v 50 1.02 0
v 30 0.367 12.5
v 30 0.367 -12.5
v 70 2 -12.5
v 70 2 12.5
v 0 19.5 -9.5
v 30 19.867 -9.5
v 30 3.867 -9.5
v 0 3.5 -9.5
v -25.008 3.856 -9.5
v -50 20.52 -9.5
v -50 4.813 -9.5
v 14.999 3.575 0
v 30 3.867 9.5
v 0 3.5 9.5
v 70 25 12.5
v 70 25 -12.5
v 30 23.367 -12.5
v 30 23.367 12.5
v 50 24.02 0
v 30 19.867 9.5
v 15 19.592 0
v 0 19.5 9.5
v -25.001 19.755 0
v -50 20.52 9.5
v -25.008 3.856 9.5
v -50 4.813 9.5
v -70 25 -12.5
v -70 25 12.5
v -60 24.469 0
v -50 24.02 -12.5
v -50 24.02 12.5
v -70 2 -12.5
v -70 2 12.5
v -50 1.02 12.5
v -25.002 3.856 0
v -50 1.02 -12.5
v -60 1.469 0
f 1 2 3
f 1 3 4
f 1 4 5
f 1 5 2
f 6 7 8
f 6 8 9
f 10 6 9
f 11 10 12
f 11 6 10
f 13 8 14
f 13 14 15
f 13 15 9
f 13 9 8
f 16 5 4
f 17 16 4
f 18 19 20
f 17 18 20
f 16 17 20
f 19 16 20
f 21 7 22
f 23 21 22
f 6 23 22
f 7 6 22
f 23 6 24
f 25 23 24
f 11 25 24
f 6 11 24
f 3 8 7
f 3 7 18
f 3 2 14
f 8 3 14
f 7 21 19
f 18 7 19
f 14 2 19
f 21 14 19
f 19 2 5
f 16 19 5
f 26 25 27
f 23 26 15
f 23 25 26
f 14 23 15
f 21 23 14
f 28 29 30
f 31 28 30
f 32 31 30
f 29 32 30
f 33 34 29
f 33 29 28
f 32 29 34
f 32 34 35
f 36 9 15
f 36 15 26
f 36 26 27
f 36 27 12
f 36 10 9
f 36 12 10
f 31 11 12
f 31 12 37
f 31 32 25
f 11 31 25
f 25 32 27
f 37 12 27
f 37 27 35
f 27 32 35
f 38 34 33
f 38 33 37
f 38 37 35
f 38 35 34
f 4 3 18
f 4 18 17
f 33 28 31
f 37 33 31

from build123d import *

# Parameters (mm, degrees)
SKETCH1_W           = 140
SKETCH1_H           = 25
BOSS_EXTRUDE1_DEPTH = 25
CUT_EXTRUDE1_DEPTH  = 25
CUT_EXTRUDE13_DEPTH = 3
SKETCH9_W           = 80
SKETCH9_H           = 18.70062617
CUT_EXTRUDE14_DEPTH = 3


with BuildPart() as part:
    # Sketch1 → Boss-Extrude1 (new body)
    with BuildSketch(Plane(origin=(0, 0, 0), x_dir=(1, 0, 0), z_dir=(0, 1, 0))):
        Rectangle(SKETCH1_W, SKETCH1_H)
    extrude(amount=BOSS_EXTRUDE1_DEPTH)

    # Sketch5 → Cut-Extrude1 (cut)
    with BuildSketch(Plane.XY.offset(12.5)):
        with BuildLine():
            add(Edge.make_bspline(
                [(0, 23), (15, 23), (30, 23.367346939)],
                knots=[0.5, 0.5, 0.5, 0.714285714, 0.714285714, 0.714285714], degree=2))
            add(Edge.make_bspline(
                [(30, 23.367346939), (50, 23.857142857), (70, 25)],
                knots=[0.714285714, 0.714285714, 0.714285714, 1, 1, 1], degree=2))
            Line((70, 25), (30, 25))
            Line((30, 25), (0, 25))
            Line((0, 25), (0, 23))
        make_face()
        with BuildLine():
            add(Edge.make_bspline(
                [(-50, 24.020408163), (-25, 23), (0, 23)],
                knots=[0.142857143, 0.142857143, 0.142857143, 0.5, 0.5, 0.5], degree=2))
            Line((0, 23), (0, 25))
            Line((0, 25), (-50, 25))
            Line((-50, 25), (-70, 25))
            add(Edge.make_bspline(
                [(-70, 25), (-60, 24.428571429), (-50, 24.020408163)],
                knots=[0, 0, 0, 0.142857143, 0.142857143, 0.142857143], degree=2))
        make_face()
        with BuildLine():
            Line((30, 19.867346939), (30, 23.367346939))
            add(Edge.make_bspline(
                [(0, 23), (15, 23), (30, 23.367346939)],
                knots=[0.5, 0.5, 0.5, 0.714285714, 0.714285714, 0.714285714], degree=2))
            Line((0, 23), (0, 19.5))
            add(Edge.make_bspline(
                [(0, 19.5), (14.999250637, 19.500030588), (30, 19.867346939)],
                knots=[0.625031228, 0.625031228, 0.625031228, 1, 1, 1], degree=2))
        make_face()
        with BuildLine():
            Line((0, 19.5), (0, 23))
            add(Edge.make_bspline(
                [(-50, 24.020408163), (-25, 23), (0, 23)],
                knots=[0.142857143, 0.142857143, 0.142857143, 0.5, 0.5, 0.5], degree=2))
            Line((-50, 24.020408163), (-50, 21.5))
            Line((-50, 21.5), (-50, 20.520408163))
            add(Edge.make_bspline(
                [(-50, 20.520408163), (-25.002082119, 19.499949013), (0, 19.5)],
                knots=[0, 0, 0, 0.625031228, 0.625031228, 0.625031228], degree=2))
        make_face()
        with BuildLine():
            Line((0, 0), (0, 3.5))
            add(Edge.make_bspline(
                [(-50, 4.813033374), (-25.004215516, 3.554754755), (0, 3.5)],
                knots=[0, 0, 0, 0.625063216, 0.625063216, 0.625063216], degree=2))
            Line((-50, 4.813033374), (-50, 1.020408163))
            add(Edge.make_bspline(
                [(-50, 1.020408163), (-25, 0), (0, 0)],
                knots=[0.142857143, 0.142857143, 0.142857143, 0.5, 0.5, 0.5], degree=2))
        make_face()
        with BuildLine():
            Line((30, 0.367346939), (30, 3.867346939))
            add(Edge.make_bspline(
                [(0, 3.5), (14.998483233, 3.467156007), (30, 3.867346939)],
                knots=[0.625063216, 0.625063216, 0.625063216, 1, 1, 1], degree=2))
            Line((0, 3.5), (0, 0))
            add(Edge.make_bspline(
                [(0, 0), (15, 0), (30, 0.367346939)],
                knots=[0.5, 0.5, 0.5, 0.714285714, 0.714285714, 0.714285714], degree=2))
        make_face()
        with BuildLine():
            Line((70, 0), (70, 2))
            add(Edge.make_bspline(
                [(30, 0.367346939), (50, 0.857142857), (70, 2)],
                knots=[0.714285714, 0.714285714, 0.714285714, 1, 1, 1], degree=2))
            add(Edge.make_bspline(
                [(0, 0), (15, 0), (30, 0.367346939)],
                knots=[0.5, 0.5, 0.5, 0.714285714, 0.714285714, 0.714285714], degree=2))
            Line((0, 0), (70, 0))
        make_face()
        with BuildLine():
            Line((-70, 0), (0, 0))
            add(Edge.make_bspline(
                [(-50, 1.020408163), (-25, 0), (0, 0)],
                knots=[0.142857143, 0.142857143, 0.142857143, 0.5, 0.5, 0.5], degree=2))
            add(Edge.make_bspline(
                [(-70, 2), (-60, 1.428571429), (-50, 1.020408163)],
                knots=[0, 0, 0, 0.142857143, 0.142857143, 0.142857143], degree=2))
            Line((-70, 2), (-70, 0))
        make_face()
    extrude(amount=-CUT_EXTRUDE1_DEPTH, mode=Mode.SUBTRACT)

    # Sketch6 → Cut-Extrude13 (cut)
    with BuildSketch(Plane.XY.offset(12.5)):
        with BuildLine():
            Line((30, 1.485887188), (30, 3.867346939))
            add(Edge.make_bspline(
                [(-50, 4.813033374), (-10.010789538, 2.799991192), (30, 3.867346939)],
                knots=[0, 0, 0, 1, 1, 1], degree=2))
            Line((-50, 4.813033374), (-50, 1.485887188))
            Line((-50, 1.485887188), (30, 1.485887188))
        make_face()
        with BuildLine():
            Line((-50, 20.520408163), (-50, 4.813033374))
            add(Edge.make_bspline(
                [(-50, 4.813033374), (-10.010789538, 2.799991192), (30, 3.867346939)],
                knots=[0, 0, 0, 1, 1, 1], degree=2))
            Line((30, 3.867346939), (30, 19.867346939))
            add(Edge.make_bspline(
                [(30, 19.867346939), (-10.005329691, 18.887755097), (-50, 20.520408163)],
                knots=[0, 0, 0, 1, 1, 1], degree=2))
        make_face()
        Polygon((-50, 20.520408163), (30, 19.867346939), (30, 20.995155466), (30, 21.46990277), (-50, 21.46990277), align=None)
        with BuildLine():
            Line((-50, 20.520408163), (30, 19.867346939))
            add(Edge.make_bspline(
                [(30, 19.867346939), (-10.005329691, 18.887755097), (-50, 20.520408163)],
                knots=[0, 0, 0, 1, 1, 1], degree=2))
        make_face()
    extrude(amount=-CUT_EXTRUDE13_DEPTH, mode=Mode.SUBTRACT)

    # Sketch9 → Cut-Extrude14 (cut)
    with BuildSketch(Plane(origin=(0, 0, -12.5), x_dir=(-1, 0, 0), z_dir=(0, 0, -1))):
        with Locations((10, 12.267033854)):
            Rectangle(SKETCH9_W, SKETCH9_H)
    extrude(amount=-CUT_EXTRUDE14_DEPTH, mode=Mode.SUBTRACT)


solid = part.part
